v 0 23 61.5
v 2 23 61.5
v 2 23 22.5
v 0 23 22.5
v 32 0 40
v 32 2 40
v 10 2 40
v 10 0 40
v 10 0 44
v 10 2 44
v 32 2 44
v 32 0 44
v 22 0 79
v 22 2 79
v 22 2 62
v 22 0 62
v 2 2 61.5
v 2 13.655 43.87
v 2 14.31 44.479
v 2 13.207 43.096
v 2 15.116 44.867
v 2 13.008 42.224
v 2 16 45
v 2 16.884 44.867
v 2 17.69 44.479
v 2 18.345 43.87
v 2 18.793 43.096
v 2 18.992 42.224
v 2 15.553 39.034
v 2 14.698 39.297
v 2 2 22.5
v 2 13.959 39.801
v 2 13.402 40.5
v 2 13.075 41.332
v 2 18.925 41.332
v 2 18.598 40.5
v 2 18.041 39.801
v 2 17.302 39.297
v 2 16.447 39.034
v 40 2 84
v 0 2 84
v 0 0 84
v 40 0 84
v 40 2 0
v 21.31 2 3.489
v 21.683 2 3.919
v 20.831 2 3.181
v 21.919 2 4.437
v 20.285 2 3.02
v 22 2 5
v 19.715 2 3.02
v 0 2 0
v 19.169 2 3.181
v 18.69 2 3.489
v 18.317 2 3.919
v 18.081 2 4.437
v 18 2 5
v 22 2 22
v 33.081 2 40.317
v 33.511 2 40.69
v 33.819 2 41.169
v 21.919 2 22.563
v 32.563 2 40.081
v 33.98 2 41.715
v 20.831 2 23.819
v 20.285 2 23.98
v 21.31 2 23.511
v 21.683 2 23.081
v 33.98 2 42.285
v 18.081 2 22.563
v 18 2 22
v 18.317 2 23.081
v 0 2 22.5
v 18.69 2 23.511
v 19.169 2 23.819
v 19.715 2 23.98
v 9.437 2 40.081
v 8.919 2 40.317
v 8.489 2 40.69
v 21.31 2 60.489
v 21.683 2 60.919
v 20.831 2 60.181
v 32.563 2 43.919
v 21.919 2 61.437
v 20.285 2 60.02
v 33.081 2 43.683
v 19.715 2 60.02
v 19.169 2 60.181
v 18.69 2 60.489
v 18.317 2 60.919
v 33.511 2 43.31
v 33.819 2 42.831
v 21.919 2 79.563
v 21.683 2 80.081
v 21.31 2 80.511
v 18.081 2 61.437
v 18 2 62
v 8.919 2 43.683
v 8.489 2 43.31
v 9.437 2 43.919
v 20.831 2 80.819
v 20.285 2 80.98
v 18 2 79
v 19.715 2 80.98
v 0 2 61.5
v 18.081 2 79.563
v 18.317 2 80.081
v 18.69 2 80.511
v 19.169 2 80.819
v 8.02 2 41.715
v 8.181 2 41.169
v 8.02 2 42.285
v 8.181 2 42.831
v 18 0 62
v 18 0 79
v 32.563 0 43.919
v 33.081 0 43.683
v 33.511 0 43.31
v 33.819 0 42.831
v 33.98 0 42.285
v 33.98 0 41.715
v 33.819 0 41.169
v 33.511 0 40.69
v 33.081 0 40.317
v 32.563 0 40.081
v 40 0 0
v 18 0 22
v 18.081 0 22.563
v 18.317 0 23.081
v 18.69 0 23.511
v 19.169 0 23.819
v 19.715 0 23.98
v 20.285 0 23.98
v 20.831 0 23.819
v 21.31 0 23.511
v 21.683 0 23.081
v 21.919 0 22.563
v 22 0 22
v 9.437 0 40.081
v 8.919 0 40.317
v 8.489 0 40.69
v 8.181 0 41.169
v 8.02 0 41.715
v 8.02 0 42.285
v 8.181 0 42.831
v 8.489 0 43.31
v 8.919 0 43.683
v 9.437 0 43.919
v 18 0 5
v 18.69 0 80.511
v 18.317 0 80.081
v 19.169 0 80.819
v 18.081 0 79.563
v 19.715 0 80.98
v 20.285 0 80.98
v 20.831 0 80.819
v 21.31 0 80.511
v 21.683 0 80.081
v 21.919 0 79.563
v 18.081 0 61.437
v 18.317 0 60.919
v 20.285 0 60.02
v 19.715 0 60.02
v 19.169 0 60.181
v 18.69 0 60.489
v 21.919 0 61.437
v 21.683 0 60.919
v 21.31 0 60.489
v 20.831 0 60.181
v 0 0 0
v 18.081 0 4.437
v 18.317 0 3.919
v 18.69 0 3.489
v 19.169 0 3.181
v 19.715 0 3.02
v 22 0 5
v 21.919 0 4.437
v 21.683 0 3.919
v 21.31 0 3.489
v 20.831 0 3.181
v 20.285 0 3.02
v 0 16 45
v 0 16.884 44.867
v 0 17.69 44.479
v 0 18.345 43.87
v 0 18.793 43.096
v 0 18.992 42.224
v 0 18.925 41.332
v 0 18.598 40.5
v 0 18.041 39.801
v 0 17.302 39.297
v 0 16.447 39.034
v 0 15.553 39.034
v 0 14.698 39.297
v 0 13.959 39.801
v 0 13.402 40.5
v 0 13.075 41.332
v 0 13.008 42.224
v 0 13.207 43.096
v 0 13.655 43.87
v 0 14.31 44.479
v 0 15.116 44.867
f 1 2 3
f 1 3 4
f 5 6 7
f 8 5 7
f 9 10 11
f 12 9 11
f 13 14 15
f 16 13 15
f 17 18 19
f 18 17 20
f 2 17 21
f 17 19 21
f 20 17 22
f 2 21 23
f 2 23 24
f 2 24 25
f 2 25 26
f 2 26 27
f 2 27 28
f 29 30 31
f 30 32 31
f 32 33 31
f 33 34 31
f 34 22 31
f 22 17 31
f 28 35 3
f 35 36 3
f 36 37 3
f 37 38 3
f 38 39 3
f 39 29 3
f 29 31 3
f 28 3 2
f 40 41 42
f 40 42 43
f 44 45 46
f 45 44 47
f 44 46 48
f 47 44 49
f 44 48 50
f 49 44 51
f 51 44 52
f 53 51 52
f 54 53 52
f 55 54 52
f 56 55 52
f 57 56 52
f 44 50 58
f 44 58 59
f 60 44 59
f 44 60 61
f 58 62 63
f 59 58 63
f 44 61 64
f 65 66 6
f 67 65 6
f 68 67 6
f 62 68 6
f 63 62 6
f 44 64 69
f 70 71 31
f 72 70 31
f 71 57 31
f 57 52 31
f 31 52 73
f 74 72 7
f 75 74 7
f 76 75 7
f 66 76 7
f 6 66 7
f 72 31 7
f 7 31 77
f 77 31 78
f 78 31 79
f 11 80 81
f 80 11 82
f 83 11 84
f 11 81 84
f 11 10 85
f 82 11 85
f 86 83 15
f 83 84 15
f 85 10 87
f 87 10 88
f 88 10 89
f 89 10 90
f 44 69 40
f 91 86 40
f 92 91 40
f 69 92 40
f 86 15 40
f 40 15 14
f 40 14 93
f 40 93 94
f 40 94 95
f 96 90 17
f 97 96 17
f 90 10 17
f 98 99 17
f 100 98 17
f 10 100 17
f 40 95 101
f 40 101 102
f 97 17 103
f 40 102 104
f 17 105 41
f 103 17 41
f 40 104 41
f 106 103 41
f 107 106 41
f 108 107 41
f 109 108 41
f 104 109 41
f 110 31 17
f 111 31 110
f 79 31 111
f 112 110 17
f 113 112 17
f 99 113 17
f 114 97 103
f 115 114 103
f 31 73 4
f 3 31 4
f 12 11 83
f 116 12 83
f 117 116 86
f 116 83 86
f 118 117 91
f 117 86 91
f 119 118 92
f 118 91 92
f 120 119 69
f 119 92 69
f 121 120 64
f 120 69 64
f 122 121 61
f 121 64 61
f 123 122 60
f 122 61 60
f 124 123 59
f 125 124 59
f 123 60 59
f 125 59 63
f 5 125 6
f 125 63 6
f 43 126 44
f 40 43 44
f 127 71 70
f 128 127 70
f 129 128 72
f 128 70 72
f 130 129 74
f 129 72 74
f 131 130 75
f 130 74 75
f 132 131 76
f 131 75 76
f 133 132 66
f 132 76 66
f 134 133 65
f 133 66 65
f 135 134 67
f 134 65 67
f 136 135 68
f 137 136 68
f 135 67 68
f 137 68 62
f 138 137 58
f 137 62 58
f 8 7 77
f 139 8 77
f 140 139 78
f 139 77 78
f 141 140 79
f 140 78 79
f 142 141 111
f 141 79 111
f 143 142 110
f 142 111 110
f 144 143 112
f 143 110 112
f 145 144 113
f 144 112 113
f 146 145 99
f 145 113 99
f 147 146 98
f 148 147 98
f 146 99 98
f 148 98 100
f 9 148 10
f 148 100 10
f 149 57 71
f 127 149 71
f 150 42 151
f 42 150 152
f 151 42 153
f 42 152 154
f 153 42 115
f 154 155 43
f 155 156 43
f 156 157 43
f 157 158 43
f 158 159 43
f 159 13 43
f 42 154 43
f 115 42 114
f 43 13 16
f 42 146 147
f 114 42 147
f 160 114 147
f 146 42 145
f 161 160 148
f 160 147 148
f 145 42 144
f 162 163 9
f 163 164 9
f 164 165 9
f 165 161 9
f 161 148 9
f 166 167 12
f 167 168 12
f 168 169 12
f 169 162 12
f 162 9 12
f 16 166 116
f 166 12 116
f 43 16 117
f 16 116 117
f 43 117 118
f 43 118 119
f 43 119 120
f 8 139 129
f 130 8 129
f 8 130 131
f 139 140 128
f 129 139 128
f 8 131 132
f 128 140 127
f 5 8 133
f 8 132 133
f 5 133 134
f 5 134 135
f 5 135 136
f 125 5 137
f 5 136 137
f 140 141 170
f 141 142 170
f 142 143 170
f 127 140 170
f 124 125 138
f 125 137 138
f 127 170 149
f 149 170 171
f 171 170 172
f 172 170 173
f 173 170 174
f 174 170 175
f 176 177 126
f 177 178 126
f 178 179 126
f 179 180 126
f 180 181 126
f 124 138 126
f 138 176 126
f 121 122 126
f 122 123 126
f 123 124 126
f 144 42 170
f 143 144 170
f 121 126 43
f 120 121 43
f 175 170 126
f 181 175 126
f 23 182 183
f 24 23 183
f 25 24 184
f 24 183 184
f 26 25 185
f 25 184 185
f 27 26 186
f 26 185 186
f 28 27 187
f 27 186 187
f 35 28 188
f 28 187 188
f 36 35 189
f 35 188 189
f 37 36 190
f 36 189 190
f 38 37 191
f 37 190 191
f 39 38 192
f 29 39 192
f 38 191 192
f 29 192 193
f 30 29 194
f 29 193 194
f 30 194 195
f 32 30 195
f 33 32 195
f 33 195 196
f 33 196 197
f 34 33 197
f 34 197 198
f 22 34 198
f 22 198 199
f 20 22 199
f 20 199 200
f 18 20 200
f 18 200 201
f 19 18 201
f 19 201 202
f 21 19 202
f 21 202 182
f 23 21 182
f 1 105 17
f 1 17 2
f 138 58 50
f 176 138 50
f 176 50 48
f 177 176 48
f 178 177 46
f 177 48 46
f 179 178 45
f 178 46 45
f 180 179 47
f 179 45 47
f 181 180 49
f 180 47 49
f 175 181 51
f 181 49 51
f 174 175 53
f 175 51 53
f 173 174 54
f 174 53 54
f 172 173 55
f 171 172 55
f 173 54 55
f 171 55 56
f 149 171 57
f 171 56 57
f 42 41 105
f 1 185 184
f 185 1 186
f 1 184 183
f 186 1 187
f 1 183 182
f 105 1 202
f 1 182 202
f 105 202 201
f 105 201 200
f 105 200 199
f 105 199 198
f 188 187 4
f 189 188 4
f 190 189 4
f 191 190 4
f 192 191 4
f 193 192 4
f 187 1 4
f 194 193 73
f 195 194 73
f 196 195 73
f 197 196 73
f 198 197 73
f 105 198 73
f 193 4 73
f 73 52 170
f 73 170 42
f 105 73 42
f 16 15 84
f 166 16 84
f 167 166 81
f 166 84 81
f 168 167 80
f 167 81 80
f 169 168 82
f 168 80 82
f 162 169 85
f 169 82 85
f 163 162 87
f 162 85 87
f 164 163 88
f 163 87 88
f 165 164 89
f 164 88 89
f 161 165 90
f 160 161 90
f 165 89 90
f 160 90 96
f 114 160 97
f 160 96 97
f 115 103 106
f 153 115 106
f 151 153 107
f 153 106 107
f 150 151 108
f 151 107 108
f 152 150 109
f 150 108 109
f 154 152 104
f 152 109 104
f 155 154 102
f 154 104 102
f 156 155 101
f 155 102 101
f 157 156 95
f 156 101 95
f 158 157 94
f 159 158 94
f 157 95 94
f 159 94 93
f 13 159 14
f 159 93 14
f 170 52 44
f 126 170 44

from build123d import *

# Parameters (mm, degrees)
EXTRUDE_1_DEPTH     = 84
CUT_EXTRUDE_1_DEPTH = 10
SKETCH_4_R          = 3
CUT_EXTRUDE_2_DEPTH = 10
SKETCH_5_W          = 22.5
SKETCH_5_H          = 21
CUT_EXTRUDE_3_DEPTH = 10


with BuildPart() as part:
    # Эскиз2 → Вытянуть-Тонкостенный1 (new body)
    with BuildSketch(Plane.XY):
        Polygon((0, 23), (0, 0), (40, 0), (40, 2), (2, 2), (2, 23), align=None)
    extrude(amount=EXTRUDE_1_DEPTH)

    # Эскиз3 → Вырез-Вытянуть1 (cut)
    with BuildSketch(Plane(origin=(0, 2, 0), x_dir=(1, 0, 0), z_dir=(0, 1, 0))):
        with BuildLine():
            Line((32, -40), (10, -40))
            ThreePointArc((10, -40), (8, -42), (10, -44))
            Line((10, -44), (32, -44))
            ThreePointArc((32, -44), (34, -42), (32, -40))
        make_face()
        with BuildLine():
            Line((18, -5), (18, -22))
            ThreePointArc((18, -22), (20, -24), (22, -22))
            Line((22, -22), (22, -5))
            ThreePointArc((22, -5), (20, -3), (18, -5))
        make_face()
        with BuildLine():
            Line((22, -79), (22, -62))
            ThreePointArc((22, -62), (20, -60), (18, -62))
            Line((18, -62), (18, -79))
            ThreePointArc((18, -79), (20, -81), (22, -79))
        make_face()
    extrude(amount=-CUT_EXTRUDE_1_DEPTH, mode=Mode.SUBTRACT)

    # Эскиз4 → Вырез-Вытянуть2 (cut)
    with BuildSketch(Plane.ZY):
        with Locations((42, 16)):
            Circle(SKETCH_4_R)
    extrude(amount=-CUT_EXTRUDE_2_DEPTH, mode=Mode.SUBTRACT)

    # Эскиз5 → Вырез-Вытянуть3 (cut)
    with BuildSketch(Plane.ZY):
        with Locations((11.25, 12.5)):
            Rectangle(SKETCH_5_W, SKETCH_5_H)
        with Locations((72.75, 12.5)):
            Rectangle(SKETCH_5_W, SKETCH_5_H)
    extrude(amount=-CUT_EXTRUDE_3_DEPTH, mode=Mode.SUBTRACT)


solid = part.part
